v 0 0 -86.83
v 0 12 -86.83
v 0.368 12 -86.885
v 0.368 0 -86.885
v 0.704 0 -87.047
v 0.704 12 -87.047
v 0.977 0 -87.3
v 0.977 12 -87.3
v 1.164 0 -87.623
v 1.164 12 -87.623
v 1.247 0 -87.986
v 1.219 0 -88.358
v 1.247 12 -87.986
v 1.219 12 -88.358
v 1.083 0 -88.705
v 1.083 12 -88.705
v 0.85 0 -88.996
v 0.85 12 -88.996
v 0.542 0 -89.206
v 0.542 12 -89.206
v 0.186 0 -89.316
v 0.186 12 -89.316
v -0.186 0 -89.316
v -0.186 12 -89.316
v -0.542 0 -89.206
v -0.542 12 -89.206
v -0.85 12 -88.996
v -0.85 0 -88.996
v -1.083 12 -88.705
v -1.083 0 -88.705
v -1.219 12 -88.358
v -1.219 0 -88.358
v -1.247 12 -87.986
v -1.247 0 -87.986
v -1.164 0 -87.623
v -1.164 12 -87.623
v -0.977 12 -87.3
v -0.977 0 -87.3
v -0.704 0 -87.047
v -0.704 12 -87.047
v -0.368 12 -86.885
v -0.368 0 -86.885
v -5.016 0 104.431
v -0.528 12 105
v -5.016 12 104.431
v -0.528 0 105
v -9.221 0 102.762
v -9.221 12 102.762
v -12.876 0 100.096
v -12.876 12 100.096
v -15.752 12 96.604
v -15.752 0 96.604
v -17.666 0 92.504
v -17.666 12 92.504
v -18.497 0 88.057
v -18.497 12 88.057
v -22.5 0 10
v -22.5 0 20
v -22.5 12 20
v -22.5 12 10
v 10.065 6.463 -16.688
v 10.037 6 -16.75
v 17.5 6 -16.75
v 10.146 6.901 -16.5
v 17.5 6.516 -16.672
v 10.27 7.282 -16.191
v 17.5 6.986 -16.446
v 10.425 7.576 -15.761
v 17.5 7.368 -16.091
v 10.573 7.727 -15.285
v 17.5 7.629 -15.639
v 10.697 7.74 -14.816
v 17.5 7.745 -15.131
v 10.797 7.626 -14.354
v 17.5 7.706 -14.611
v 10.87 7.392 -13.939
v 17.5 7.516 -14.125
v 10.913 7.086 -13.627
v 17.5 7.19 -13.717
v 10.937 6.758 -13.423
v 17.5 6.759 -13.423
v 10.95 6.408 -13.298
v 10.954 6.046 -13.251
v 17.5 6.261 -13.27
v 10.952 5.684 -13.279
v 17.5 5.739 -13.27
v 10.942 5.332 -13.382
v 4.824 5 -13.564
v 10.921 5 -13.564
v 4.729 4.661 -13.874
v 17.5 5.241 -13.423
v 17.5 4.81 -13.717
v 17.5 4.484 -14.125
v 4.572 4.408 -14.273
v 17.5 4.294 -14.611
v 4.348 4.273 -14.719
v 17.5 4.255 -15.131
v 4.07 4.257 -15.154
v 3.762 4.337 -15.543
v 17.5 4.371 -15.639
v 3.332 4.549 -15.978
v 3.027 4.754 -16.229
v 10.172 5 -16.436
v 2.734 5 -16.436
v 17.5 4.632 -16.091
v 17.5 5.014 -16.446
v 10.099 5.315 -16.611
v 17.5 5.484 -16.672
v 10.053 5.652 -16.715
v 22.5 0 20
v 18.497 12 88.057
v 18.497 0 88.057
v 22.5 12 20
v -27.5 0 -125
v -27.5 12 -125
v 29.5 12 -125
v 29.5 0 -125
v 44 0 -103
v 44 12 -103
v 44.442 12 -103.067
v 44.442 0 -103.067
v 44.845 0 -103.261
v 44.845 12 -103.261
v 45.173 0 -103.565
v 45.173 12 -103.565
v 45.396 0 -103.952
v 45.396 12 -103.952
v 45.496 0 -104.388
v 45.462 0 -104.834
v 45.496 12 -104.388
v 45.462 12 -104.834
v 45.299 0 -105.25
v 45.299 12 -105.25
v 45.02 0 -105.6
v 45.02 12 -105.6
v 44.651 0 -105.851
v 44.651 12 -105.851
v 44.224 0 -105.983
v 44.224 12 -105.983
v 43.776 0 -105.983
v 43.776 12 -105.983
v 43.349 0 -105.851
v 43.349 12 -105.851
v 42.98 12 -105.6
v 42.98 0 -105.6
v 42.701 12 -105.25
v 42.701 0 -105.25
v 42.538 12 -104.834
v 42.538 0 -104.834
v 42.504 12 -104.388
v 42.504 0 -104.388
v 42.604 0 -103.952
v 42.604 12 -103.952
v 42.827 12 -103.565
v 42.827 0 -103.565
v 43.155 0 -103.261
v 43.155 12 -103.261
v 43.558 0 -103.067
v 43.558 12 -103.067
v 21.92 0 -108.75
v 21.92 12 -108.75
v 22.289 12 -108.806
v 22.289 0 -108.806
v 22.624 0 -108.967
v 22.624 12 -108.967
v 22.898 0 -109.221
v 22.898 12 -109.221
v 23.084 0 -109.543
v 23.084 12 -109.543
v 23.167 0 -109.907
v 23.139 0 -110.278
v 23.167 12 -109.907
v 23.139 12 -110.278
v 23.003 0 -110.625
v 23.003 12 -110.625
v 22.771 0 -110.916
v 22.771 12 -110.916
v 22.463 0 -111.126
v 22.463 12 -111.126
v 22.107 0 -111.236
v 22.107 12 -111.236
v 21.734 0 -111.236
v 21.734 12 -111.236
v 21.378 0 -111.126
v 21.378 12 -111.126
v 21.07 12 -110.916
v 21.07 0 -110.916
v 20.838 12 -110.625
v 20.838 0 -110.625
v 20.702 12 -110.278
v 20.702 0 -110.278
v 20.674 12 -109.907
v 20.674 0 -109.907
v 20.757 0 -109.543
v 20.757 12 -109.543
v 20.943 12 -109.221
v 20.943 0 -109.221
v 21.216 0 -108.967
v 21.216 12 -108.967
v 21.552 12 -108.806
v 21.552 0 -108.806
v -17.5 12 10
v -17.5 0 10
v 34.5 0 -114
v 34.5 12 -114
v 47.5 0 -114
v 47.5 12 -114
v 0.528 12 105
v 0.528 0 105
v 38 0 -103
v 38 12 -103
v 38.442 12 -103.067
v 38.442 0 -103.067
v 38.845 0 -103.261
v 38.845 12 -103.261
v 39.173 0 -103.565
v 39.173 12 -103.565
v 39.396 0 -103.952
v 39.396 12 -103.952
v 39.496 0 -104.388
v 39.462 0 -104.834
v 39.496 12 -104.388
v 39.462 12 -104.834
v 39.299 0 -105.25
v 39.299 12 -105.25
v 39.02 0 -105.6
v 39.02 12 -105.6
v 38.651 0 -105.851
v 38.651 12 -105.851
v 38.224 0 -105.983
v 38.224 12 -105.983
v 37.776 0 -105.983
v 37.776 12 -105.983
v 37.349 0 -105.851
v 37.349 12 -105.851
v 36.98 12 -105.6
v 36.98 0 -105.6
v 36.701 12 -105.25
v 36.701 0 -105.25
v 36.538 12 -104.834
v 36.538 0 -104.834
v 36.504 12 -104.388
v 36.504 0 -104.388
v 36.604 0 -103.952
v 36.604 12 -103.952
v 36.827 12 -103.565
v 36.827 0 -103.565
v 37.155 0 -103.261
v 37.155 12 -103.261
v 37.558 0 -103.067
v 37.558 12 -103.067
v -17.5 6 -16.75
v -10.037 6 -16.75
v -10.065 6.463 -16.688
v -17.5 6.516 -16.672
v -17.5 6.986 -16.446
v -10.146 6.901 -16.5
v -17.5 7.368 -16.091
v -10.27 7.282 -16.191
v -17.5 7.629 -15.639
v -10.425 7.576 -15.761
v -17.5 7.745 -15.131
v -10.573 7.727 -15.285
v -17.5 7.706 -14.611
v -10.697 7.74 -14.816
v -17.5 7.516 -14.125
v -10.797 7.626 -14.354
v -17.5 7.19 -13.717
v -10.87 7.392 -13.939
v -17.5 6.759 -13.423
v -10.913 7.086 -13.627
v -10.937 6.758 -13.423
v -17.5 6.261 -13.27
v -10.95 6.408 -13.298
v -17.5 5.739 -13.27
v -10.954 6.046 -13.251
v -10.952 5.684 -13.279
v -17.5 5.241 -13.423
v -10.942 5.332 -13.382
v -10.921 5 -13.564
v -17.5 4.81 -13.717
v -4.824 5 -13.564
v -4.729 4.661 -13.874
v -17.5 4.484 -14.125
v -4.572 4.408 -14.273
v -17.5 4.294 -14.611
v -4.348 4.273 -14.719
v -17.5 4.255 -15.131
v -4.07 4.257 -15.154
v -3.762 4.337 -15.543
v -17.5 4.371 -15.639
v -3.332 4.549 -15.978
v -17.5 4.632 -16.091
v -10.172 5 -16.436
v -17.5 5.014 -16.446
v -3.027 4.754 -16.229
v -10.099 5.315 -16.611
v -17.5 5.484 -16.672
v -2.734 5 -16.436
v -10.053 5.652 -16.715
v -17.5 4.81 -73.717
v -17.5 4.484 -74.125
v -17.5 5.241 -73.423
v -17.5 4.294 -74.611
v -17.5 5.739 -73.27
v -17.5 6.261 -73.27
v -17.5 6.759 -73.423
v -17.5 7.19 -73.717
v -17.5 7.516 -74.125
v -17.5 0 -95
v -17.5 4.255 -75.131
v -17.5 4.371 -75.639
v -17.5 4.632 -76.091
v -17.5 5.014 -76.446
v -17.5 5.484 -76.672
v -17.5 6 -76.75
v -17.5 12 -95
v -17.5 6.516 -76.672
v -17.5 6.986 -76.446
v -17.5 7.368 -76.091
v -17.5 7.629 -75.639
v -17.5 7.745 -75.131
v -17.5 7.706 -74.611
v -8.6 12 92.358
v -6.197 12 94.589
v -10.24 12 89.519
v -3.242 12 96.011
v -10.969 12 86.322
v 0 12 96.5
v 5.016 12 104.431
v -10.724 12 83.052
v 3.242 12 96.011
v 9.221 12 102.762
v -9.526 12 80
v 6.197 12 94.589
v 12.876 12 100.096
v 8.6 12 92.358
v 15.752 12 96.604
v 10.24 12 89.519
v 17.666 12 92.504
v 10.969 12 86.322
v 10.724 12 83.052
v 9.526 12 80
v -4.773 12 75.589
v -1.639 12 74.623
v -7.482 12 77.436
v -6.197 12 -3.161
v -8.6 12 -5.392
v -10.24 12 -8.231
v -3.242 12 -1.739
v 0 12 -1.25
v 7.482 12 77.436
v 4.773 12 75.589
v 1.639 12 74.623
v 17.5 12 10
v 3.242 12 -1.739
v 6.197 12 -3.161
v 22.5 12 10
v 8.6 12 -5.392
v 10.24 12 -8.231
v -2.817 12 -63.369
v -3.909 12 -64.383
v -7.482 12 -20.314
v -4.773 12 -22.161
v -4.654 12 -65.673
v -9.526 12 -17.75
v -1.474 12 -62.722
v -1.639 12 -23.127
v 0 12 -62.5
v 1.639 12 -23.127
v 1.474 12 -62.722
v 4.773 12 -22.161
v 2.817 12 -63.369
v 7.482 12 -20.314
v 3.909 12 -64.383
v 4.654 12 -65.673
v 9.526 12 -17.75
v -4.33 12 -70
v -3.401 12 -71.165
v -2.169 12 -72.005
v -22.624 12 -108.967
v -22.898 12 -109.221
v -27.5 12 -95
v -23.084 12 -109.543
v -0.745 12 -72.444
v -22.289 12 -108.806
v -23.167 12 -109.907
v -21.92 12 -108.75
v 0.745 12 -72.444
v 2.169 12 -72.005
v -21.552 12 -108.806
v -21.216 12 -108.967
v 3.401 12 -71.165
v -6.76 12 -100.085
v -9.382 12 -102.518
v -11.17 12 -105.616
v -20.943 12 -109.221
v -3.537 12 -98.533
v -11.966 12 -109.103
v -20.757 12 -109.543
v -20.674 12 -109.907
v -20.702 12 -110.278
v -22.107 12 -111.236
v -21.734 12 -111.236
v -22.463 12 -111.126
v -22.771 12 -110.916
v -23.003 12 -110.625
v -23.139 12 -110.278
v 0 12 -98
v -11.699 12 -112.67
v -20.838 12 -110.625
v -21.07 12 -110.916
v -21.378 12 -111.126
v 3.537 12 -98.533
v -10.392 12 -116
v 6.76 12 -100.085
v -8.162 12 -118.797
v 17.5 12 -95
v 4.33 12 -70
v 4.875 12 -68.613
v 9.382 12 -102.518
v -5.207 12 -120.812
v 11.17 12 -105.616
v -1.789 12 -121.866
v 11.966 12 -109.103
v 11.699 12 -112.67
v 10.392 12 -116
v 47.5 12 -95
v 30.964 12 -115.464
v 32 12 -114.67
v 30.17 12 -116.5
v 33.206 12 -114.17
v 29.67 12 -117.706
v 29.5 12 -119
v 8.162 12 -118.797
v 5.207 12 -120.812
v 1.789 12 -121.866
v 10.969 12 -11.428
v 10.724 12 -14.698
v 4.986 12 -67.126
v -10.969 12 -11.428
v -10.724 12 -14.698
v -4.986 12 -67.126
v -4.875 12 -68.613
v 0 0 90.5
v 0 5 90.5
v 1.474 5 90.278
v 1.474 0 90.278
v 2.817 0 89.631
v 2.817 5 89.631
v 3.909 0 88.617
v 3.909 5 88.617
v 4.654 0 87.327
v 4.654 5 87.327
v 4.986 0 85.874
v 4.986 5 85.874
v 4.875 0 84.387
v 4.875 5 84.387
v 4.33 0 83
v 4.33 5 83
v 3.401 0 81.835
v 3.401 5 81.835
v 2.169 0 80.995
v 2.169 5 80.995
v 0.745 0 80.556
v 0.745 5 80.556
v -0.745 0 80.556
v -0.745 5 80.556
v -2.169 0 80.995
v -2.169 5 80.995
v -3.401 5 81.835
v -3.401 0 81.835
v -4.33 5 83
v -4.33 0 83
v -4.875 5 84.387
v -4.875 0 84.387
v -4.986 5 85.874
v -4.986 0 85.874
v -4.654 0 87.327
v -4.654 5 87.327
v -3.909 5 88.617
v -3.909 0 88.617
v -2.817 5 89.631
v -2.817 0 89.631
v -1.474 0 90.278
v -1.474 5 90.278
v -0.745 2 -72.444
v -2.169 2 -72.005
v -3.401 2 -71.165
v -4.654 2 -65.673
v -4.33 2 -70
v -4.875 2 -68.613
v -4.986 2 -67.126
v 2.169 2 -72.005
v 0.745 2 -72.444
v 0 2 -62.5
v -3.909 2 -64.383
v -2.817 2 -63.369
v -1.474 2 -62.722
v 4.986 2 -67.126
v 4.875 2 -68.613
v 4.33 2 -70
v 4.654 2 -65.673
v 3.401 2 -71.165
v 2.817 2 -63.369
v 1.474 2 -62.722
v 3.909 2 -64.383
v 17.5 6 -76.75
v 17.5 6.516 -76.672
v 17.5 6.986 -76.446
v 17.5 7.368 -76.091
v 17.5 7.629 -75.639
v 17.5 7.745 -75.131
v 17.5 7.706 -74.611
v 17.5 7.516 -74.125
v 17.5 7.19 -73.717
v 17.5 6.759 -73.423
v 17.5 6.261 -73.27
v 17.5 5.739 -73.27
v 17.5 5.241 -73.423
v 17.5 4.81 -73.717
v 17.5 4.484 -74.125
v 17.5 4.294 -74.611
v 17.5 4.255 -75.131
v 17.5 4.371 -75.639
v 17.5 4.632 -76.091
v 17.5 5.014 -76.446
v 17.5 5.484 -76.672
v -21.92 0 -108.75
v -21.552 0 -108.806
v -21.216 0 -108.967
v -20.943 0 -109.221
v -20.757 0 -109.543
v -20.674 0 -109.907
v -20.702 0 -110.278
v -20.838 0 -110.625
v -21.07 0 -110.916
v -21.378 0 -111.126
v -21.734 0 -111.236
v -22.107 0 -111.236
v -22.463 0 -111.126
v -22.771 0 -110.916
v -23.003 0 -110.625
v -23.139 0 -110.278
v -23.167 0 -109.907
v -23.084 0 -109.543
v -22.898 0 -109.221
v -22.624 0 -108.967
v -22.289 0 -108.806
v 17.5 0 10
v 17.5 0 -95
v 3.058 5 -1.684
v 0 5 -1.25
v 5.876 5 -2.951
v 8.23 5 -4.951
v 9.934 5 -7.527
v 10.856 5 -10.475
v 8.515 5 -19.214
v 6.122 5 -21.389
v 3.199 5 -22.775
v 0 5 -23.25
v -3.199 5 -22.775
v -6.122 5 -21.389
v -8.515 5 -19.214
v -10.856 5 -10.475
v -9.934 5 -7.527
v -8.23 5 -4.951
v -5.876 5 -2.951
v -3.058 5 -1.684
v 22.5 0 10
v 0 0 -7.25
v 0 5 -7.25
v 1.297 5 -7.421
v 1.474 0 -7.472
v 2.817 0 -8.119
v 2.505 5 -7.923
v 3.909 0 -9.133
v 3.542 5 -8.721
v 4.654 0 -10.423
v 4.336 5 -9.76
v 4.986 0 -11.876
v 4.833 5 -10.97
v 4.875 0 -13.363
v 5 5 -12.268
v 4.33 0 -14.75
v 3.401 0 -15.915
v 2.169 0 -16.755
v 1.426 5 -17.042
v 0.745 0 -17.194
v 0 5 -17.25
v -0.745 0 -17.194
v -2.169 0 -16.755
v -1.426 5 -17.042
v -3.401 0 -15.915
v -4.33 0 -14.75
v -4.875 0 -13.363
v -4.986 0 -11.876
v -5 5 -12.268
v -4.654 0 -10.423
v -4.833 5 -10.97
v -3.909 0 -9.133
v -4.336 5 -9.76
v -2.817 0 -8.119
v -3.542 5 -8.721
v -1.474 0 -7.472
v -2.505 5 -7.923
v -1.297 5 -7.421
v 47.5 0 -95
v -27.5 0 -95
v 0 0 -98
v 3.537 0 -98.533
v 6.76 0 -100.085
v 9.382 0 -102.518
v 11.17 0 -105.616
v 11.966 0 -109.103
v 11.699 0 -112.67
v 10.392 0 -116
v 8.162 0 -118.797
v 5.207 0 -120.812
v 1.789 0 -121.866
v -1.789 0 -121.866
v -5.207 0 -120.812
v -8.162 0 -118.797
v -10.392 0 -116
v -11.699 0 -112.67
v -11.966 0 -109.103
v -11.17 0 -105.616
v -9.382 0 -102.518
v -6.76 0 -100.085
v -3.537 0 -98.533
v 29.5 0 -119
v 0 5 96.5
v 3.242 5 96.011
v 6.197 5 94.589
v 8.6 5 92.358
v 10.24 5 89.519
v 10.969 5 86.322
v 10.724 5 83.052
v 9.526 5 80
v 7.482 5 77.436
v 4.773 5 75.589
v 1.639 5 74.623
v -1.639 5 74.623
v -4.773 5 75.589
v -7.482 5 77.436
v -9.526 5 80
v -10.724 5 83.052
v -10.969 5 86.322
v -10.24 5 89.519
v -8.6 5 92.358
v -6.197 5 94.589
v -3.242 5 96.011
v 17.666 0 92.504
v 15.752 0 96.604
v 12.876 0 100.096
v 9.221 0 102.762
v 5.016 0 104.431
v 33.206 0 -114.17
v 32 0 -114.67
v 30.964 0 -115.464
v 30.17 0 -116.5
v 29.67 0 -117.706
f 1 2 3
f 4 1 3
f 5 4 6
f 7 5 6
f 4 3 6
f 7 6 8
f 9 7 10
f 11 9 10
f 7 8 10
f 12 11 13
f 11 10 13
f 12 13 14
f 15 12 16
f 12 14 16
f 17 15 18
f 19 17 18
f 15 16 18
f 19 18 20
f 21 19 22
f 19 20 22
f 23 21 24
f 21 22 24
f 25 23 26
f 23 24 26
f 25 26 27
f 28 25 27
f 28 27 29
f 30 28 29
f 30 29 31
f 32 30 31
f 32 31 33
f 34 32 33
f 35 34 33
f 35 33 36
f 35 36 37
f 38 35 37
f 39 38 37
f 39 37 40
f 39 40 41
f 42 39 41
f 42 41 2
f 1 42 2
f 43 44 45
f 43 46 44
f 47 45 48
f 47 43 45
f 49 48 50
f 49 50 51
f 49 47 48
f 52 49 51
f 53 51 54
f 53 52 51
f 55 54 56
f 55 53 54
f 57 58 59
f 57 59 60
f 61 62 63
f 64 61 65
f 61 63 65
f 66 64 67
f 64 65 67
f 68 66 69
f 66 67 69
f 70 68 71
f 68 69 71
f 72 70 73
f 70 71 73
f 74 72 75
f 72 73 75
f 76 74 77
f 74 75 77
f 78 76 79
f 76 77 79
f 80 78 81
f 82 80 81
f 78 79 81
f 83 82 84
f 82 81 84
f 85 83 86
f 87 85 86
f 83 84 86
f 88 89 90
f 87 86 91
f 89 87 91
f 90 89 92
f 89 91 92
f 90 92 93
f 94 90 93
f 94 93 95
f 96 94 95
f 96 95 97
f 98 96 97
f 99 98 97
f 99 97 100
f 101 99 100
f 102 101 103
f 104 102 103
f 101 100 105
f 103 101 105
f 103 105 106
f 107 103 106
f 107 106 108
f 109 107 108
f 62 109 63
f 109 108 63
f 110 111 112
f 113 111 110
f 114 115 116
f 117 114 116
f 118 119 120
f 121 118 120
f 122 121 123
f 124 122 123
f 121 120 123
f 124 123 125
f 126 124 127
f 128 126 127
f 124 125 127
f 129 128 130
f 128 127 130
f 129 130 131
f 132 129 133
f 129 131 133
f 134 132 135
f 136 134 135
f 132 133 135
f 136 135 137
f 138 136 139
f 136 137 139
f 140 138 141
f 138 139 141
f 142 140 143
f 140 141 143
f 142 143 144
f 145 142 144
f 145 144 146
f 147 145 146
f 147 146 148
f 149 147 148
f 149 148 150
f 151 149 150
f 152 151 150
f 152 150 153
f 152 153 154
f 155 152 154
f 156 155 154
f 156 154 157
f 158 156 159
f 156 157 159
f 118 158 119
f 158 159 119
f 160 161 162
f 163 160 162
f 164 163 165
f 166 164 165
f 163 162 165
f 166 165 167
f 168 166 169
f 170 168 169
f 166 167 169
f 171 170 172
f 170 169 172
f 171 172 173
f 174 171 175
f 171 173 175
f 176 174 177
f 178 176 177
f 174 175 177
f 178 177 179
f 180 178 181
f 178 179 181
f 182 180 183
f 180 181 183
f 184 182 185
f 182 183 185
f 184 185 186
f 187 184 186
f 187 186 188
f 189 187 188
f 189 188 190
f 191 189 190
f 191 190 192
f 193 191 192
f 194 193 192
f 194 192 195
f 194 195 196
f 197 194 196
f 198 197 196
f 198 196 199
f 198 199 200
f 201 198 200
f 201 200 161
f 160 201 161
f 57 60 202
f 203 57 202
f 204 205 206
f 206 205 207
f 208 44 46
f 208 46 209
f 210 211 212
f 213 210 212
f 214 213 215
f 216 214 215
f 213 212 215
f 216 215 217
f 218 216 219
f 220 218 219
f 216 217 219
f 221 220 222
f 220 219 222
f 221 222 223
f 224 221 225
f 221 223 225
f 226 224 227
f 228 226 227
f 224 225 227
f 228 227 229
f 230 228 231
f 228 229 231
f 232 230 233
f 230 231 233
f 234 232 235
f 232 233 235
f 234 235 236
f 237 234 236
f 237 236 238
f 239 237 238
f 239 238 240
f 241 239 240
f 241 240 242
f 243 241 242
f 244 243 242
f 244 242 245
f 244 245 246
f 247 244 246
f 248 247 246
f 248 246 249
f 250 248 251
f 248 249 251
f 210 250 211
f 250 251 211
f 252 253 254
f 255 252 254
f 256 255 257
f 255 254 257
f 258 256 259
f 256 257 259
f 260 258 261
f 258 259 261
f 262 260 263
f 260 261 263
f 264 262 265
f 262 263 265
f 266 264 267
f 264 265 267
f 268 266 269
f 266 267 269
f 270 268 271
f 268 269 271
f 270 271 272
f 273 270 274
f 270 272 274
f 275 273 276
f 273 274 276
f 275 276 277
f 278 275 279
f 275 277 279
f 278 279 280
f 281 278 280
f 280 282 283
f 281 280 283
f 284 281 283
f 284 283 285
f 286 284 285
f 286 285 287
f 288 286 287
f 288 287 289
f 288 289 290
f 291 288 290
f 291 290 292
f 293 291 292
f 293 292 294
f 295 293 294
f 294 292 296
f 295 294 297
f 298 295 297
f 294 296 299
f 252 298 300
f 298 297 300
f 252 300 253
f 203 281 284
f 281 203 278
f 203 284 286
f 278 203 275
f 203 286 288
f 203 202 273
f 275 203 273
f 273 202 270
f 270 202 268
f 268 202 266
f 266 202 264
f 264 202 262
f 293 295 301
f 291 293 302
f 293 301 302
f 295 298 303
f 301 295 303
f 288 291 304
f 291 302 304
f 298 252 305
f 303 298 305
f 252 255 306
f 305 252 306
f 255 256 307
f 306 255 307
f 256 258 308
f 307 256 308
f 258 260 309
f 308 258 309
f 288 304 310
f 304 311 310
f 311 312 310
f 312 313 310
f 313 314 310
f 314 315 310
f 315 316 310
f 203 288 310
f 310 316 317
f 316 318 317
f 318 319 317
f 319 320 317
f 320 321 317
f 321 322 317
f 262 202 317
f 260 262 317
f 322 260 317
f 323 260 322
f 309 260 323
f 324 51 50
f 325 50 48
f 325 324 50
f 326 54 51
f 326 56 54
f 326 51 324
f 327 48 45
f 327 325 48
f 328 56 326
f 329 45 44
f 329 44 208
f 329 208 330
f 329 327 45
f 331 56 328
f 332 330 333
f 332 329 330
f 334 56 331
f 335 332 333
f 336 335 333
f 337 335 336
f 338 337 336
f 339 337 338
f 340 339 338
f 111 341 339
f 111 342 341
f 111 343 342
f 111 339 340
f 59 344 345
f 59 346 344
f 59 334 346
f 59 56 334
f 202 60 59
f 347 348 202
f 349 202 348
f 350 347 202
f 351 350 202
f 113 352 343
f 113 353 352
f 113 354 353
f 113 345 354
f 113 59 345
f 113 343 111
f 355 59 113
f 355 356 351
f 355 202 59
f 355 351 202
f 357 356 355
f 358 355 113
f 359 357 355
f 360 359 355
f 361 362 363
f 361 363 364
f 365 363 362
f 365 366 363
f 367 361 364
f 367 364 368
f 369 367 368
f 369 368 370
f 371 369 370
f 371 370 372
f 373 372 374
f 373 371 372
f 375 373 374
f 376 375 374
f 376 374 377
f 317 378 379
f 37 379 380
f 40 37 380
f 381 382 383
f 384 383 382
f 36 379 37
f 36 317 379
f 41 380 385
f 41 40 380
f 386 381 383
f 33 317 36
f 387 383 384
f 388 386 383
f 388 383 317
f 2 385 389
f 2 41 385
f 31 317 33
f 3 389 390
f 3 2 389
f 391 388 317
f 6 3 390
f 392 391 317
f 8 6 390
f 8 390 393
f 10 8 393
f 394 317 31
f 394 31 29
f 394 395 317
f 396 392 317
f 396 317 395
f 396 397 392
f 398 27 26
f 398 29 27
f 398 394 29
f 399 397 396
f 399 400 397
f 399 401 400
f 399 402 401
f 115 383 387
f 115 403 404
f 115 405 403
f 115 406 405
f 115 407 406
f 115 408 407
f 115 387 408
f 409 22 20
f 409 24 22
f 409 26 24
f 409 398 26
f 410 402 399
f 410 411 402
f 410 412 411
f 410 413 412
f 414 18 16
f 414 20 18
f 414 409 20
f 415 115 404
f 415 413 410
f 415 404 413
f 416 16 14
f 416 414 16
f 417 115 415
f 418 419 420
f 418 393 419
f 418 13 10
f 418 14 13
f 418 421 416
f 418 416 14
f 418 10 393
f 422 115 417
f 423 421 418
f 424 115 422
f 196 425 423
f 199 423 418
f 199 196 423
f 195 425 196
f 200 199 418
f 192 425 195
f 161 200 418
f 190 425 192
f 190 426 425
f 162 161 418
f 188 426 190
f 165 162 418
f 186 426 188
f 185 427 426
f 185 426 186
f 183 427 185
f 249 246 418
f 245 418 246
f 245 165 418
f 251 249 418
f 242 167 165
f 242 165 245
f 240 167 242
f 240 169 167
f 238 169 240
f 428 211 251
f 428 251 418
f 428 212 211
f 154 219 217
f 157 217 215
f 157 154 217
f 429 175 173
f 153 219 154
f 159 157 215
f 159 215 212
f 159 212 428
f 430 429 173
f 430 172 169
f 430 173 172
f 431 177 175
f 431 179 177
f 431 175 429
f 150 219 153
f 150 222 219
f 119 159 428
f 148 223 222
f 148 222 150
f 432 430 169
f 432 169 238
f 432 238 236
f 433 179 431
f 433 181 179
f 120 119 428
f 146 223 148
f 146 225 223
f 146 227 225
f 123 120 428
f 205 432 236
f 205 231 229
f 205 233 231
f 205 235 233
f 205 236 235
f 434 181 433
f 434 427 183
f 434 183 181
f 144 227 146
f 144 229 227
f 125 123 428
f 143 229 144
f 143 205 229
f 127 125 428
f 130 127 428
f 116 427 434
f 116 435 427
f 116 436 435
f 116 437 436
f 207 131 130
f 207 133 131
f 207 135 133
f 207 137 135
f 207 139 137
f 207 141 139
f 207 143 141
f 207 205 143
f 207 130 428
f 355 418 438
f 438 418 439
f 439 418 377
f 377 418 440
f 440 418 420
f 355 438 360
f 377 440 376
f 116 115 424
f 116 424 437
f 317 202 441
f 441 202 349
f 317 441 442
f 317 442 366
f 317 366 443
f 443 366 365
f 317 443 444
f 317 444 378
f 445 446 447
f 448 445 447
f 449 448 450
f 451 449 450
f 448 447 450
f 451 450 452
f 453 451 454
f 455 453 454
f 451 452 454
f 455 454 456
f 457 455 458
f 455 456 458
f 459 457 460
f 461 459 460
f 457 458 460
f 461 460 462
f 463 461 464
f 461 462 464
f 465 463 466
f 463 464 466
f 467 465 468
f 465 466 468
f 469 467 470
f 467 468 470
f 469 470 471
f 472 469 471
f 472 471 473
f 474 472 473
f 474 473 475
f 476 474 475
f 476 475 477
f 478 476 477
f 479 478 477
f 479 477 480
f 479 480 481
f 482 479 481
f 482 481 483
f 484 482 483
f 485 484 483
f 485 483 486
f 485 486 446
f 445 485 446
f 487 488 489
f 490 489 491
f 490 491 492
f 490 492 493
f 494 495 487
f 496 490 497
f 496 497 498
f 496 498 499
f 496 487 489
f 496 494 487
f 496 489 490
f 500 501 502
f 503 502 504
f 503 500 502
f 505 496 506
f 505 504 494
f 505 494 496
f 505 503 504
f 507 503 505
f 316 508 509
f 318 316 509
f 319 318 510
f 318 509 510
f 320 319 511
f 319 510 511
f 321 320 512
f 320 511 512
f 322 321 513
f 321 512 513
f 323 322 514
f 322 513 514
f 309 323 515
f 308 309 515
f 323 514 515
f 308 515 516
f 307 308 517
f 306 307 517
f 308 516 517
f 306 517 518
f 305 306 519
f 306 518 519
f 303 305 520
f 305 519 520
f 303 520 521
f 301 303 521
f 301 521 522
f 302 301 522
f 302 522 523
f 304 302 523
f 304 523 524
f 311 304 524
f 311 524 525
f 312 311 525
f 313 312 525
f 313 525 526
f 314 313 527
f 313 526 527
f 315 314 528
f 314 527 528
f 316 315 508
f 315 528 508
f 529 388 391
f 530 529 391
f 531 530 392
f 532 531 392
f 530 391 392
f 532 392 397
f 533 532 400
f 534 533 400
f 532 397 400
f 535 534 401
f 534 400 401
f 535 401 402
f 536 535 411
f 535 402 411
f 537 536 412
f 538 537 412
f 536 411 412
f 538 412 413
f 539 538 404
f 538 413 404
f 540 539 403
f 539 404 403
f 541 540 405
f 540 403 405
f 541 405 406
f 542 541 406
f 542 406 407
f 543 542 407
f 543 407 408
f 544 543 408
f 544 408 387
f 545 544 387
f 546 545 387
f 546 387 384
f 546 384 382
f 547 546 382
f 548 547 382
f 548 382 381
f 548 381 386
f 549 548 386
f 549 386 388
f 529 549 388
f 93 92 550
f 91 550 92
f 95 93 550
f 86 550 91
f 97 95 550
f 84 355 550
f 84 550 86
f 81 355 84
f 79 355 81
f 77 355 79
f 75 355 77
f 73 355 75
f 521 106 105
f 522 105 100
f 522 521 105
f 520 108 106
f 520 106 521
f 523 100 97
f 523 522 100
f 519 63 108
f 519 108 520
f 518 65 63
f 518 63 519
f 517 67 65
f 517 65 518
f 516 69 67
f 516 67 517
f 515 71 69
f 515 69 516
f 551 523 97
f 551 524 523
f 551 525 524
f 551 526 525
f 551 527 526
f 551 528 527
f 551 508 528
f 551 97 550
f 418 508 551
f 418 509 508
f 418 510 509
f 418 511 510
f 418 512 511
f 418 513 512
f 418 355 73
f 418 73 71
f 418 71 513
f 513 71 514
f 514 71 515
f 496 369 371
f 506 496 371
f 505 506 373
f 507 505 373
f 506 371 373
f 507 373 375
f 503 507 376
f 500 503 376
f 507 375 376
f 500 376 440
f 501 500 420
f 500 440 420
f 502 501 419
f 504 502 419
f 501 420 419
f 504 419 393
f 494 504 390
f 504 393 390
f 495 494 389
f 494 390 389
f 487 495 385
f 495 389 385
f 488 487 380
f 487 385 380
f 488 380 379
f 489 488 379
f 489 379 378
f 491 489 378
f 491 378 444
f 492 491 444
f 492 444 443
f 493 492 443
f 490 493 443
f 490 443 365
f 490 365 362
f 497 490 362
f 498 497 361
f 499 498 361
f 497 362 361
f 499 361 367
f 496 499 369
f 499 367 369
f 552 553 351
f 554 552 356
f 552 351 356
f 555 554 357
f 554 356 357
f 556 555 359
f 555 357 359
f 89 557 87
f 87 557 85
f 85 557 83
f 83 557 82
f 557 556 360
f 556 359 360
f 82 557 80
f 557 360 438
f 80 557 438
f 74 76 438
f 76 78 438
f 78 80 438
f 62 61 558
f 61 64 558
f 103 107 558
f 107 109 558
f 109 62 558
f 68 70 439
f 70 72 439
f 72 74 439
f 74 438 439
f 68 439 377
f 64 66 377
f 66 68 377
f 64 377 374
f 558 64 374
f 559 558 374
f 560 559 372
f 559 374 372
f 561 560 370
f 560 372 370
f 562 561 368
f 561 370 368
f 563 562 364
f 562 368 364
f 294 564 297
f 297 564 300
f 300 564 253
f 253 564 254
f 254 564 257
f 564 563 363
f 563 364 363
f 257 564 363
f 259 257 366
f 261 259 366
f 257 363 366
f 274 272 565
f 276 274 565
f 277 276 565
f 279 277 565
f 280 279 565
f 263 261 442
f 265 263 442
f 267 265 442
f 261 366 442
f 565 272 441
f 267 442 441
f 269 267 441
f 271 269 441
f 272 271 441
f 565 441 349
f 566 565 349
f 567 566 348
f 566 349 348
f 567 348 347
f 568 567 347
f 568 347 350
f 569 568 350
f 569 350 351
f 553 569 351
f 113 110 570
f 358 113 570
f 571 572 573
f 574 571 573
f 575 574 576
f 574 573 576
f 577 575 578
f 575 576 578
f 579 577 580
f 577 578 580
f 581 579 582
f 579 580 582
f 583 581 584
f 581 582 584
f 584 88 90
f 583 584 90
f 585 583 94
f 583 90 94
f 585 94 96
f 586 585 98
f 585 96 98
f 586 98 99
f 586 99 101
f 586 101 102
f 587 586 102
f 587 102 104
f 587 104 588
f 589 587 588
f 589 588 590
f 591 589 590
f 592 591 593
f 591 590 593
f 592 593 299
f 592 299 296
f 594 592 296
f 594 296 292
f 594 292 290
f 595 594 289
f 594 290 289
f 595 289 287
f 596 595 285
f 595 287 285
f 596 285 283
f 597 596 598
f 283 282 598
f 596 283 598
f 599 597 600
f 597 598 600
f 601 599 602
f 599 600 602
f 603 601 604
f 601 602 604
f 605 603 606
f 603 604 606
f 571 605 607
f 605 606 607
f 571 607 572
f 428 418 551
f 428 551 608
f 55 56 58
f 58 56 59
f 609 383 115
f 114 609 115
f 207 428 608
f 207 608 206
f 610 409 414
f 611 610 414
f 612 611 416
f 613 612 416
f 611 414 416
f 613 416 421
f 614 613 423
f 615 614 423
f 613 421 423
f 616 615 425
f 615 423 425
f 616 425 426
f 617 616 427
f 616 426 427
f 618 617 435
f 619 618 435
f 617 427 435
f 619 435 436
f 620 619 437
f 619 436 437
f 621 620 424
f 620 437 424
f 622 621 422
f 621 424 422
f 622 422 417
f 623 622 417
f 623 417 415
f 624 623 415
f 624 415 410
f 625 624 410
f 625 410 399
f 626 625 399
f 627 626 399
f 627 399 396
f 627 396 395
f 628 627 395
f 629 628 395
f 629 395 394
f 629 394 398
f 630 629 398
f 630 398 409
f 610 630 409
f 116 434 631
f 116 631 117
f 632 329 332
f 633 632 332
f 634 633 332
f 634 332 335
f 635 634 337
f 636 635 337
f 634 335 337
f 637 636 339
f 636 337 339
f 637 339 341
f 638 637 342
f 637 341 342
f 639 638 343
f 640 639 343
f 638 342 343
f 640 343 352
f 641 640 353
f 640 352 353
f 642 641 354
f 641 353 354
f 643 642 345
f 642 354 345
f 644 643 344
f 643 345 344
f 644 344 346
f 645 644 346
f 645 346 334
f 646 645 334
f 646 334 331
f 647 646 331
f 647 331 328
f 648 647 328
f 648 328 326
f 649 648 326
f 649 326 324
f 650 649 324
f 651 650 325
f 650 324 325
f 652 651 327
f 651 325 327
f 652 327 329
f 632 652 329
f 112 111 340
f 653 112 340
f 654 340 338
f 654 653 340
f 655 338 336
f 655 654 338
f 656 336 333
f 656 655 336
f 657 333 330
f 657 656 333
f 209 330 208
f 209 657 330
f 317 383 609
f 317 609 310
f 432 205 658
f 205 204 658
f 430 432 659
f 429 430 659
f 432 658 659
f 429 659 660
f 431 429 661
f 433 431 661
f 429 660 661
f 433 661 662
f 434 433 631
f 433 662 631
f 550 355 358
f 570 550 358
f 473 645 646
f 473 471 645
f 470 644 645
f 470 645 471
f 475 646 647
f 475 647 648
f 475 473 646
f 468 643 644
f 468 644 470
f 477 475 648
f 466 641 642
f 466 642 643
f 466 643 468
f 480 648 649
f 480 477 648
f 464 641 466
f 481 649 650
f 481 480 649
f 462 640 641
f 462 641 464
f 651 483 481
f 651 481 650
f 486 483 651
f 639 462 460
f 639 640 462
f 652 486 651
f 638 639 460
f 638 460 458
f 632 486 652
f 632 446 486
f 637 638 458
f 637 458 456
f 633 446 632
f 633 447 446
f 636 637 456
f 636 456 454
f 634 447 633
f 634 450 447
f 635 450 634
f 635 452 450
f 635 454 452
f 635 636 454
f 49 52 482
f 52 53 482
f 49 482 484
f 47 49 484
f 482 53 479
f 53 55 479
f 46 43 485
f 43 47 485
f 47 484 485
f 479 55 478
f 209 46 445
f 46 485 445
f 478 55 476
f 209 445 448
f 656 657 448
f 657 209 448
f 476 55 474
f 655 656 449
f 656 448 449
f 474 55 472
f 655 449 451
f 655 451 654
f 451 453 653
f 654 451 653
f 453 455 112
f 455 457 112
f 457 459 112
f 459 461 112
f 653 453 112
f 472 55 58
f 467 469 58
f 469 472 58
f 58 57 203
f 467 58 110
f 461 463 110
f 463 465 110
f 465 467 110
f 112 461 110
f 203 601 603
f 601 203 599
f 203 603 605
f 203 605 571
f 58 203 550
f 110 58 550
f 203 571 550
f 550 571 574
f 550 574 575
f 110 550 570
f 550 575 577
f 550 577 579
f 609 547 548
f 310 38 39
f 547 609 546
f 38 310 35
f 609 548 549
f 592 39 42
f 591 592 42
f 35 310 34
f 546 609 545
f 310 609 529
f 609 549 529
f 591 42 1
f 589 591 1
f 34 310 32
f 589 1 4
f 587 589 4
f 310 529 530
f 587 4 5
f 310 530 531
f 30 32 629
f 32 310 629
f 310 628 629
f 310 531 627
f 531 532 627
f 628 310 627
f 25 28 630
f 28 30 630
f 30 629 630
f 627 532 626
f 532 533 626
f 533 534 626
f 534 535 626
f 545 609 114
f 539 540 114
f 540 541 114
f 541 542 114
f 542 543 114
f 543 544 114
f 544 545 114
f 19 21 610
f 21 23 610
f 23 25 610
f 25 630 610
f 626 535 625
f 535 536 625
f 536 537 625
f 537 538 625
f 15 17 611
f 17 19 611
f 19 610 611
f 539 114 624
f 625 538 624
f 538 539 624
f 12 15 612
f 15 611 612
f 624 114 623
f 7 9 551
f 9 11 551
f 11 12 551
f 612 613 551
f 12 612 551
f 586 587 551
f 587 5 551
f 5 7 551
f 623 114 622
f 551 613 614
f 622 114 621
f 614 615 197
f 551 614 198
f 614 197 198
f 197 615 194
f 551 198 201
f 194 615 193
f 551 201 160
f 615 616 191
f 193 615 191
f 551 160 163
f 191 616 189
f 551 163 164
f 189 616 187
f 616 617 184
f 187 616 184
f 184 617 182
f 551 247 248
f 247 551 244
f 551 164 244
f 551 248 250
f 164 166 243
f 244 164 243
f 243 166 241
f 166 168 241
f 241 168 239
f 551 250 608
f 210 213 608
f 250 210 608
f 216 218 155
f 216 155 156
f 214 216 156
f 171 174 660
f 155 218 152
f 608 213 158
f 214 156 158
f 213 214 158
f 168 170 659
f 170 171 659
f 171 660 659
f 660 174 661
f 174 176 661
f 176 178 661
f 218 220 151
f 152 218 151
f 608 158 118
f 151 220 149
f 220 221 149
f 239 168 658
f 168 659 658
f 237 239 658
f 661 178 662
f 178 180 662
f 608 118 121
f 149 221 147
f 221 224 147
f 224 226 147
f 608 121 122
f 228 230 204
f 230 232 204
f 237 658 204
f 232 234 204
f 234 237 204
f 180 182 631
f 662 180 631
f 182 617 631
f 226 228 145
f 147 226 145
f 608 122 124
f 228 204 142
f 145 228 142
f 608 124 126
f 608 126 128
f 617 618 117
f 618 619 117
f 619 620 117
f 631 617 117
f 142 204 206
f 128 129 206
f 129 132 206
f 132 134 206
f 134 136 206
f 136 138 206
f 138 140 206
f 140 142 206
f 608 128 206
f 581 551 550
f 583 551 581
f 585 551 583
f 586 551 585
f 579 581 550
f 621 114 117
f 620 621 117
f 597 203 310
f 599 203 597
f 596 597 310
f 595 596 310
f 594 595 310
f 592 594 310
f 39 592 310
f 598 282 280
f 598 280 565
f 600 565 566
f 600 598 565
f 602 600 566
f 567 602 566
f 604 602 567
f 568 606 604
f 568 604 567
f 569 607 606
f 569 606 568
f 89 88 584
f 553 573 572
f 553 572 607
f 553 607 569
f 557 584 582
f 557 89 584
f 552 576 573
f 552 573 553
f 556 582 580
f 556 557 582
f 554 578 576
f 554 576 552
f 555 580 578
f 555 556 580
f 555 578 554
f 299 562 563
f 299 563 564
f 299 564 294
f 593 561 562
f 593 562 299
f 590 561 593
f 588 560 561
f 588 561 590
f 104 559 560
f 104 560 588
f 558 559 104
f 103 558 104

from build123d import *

# Parameters (mm, degrees)
SKETCH1_W           = 45
SKETCH1_H           = 250
BOSS_EXTRUDE1_DEPTH = 12
SKETCH2_W           = 5
SKETCH2_H           = 105
CUT_EXTRUDE1_DEPTH  = 12
SKETCH3_R           = 1.75
CUT_EXTRUDE2_DEPTH  = 35
SKETCH5_W           = 25
SKETCH5_H           = 30
SKETCH5_W_2         = 5
BOSS_EXTRUDE2_DEPTH = 12
SKETCH7_R           = 12
SKETCH7_R_2         = 1.25
CUT_EXTRUDE3_DEPTH  = 35
SKETCH8_W           = 18
SKETCH8_H           = 11
CUT_EXTRUDE4_DEPTH  = 12
SKETCH10_R          = 11
CUT_EXTRUDE5_DEPTH  = 7
SKETCH11_W          = 45
SKETCH11_H          = 20
CUT_EXTRUDE6_DEPTH  = 20
FILLET3_R           = 5
SKETCH12_R          = 5
CUT_EXTRUDE7_DEPTH  = 10
SKETCH13_R          = 1.5
CUT_EXTRUDE8_DEPTH  = 12
CUT_EXTRUDE9_DEPTH  = 20
FILLET4_R           = 18
SKETCH15_R          = 5
CUT_EXTRUDE10_DEPTH = 10


with BuildPart() as part:
    # Sketch1 → Boss-Extrude1 (new body)
    with BuildSketch(Plane(origin=(0, 0, 0), x_dir=(1, 0, 0), z_dir=(0, 1, 0))):
        Rectangle(SKETCH1_W, SKETCH1_H)
    extrude(amount=BOSS_EXTRUDE1_DEPTH)

    # Sketch2 → Cut-Extrude1 (cut)
    with BuildSketch(Plane(origin=(0, 12, 0), x_dir=(1, 0, 0), z_dir=(0, 1, 0))):
        with Locations((20, 42.5)):
            Rectangle(SKETCH2_W, SKETCH2_H)
        with Locations((-20, 42.5)):
            Rectangle(SKETCH2_W, SKETCH2_H)
    extrude(amount=-CUT_EXTRUDE1_DEPTH, mode=Mode.SUBTRACT)

    # Sketch3 → Cut-Extrude2 (cut)
    with BuildSketch(Plane(origin=(17.5, 0, 0), x_dir=(0, 0, -1), z_dir=(1, 0, 0))):
        with Locations((15, 6)):
            Circle(SKETCH3_R)
        with Locations((75, 6)):
            Circle(SKETCH3_R)
    extrude(amount=-CUT_EXTRUDE2_DEPTH, mode=Mode.SUBTRACT)

    # Sketch5 → Boss-Extrude2 (add)
    with BuildSketch(Plane(origin=(0, 12, 0), x_dir=(1, 0, 0), z_dir=(0, 1, 0))):
        with Locations((35, 110)):
            Rectangle(SKETCH5_W, SKETCH5_H)
        with Locations((-25, 110)):
            Rectangle(SKETCH5_W_2, SKETCH5_H)
    extrude(amount=-BOSS_EXTRUDE2_DEPTH)

    # Sketch7 → Cut-Extrude3 (cut)
    with BuildSketch(Plane(origin=(0, 12, 0), x_dir=(1, 0, 0), z_dir=(0, 1, 0))):
        with Locations(Location((0, 110, 0), (0, 0, 270))):
            Circle(SKETCH7_R)
        with Locations(Location((21.920310217, 110, 0), (0, 0, 270))):
            Circle(SKETCH7_R_2)
        with Locations(Location((-21.920310217, 110, 0), (0, 0, 270))):
            Circle(SKETCH7_R_2)
        with Locations(Location((0, 88.079689783, 0), (0, 0, 270))):
            Circle(SKETCH7_R_2)
    extrude(amount=-CUT_EXTRUDE3_DEPTH, mode=Mode.SUBTRACT)

    # Sketch8 → Cut-Extrude4 (cut)
    with BuildSketch(Plane(origin=(0, 12, 0), x_dir=(1, 0, 0), z_dir=(0, 1, 0))):
        with Locations((38.5, 119.5)):
            Rectangle(SKETCH8_W, SKETCH8_H)
    extrude(amount=-CUT_EXTRUDE4_DEPTH, mode=Mode.SUBTRACT)

    # Sketch10 → Cut-Extrude5 (cut)
    with BuildSketch(Plane(origin=(0, 12, 0), x_dir=(1, 0, 0), z_dir=(0, 1, 0))):
        with Locations(Location((0, 12.25, 0), (0, 0, 270))):
            Circle(SKETCH10_R)
        with Locations(Location((0, -85.5, 0), (0, 0, 270))):
            Circle(SKETCH10_R)
    extrude(amount=-CUT_EXTRUDE5_DEPTH, mode=Mode.SUBTRACT)

    # Sketch11 → Cut-Extrude6 (cut)
    with BuildSketch(Plane(origin=(0, 12, 0), x_dir=(1, 0, 0), z_dir=(0, 1, 0))):
        with Locations((0, -115)):
            Rectangle(SKETCH11_W, SKETCH11_H)
    extrude(amount=-CUT_EXTRUDE6_DEPTH, mode=Mode.SUBTRACT)

    # Fillet3
    fillet3_edges = [part.edges().sort_by_distance(p)[0] for p in [
        (29.5, 6, -114),
    ]]
    fillet(fillet3_edges, radius=FILLET3_R)

    # Sketch12 → Cut-Extrude7 (cut)
    with BuildSketch(Plane(origin=(0, 5, 0), x_dir=(1, 0, 0), z_dir=(0, 1, 0))):
        with Locations(Location((0, -85.5, 0), (0, 0, 270))):
            Circle(SKETCH12_R)
        with Locations(Location((0, 12.25, 0), (0, 0, 270))):
            Circle(SKETCH12_R)
    extrude(amount=-CUT_EXTRUDE7_DEPTH, mode=Mode.SUBTRACT)

    # Sketch13 → Cut-Extrude8 (cut)
    with BuildSketch(Plane(origin=(0, 12, 0), x_dir=(1, 0, 0), z_dir=(0, 1, 0))):
        with Locations(Location((38, 104.5, 0), (0, 0, 270))):
            Circle(SKETCH13_R)
        with Locations(Location((44, 104.5, 0), (0, 0, 270))):
            Circle(SKETCH13_R)
    extrude(amount=-CUT_EXTRUDE8_DEPTH, mode=Mode.SUBTRACT)

    # Sketch14 → Cut-Extrude9 (cut)
    with BuildSketch(Plane(origin=(0, 12, 0), x_dir=(1, 0, 0), z_dir=(0, 1, 0))):
        Polygon((-22.5, -20), (-22.5, -105), (-17.5, -105), align=None)
        Polygon((17.5, -105), (22.5, -20), (22.5, -105), align=None)
    extrude(amount=-CUT_EXTRUDE9_DEPTH, mode=Mode.SUBTRACT)

    # Fillet4
    fillet4_edges = [part.edges().sort_by_distance(p)[0] for p in [
        (17.5, 6, 105),
        (-17.5, 6, 105),
    ]]
    fillet(fillet4_edges, radius=FILLET4_R)

    # Sketch15 → Cut-Extrude10 (cut)
    with BuildSketch(Plane(origin=(0, 12, 0), x_dir=(1, 0, 0), z_dir=(0, 1, 0))):
        with Locations(Location((0, 67.5, 0), (0, 0, 270))):
            Circle(SKETCH15_R)
    extrude(amount=-CUT_EXTRUDE10_DEPTH, mode=Mode.SUBTRACT)


solid = part.part
